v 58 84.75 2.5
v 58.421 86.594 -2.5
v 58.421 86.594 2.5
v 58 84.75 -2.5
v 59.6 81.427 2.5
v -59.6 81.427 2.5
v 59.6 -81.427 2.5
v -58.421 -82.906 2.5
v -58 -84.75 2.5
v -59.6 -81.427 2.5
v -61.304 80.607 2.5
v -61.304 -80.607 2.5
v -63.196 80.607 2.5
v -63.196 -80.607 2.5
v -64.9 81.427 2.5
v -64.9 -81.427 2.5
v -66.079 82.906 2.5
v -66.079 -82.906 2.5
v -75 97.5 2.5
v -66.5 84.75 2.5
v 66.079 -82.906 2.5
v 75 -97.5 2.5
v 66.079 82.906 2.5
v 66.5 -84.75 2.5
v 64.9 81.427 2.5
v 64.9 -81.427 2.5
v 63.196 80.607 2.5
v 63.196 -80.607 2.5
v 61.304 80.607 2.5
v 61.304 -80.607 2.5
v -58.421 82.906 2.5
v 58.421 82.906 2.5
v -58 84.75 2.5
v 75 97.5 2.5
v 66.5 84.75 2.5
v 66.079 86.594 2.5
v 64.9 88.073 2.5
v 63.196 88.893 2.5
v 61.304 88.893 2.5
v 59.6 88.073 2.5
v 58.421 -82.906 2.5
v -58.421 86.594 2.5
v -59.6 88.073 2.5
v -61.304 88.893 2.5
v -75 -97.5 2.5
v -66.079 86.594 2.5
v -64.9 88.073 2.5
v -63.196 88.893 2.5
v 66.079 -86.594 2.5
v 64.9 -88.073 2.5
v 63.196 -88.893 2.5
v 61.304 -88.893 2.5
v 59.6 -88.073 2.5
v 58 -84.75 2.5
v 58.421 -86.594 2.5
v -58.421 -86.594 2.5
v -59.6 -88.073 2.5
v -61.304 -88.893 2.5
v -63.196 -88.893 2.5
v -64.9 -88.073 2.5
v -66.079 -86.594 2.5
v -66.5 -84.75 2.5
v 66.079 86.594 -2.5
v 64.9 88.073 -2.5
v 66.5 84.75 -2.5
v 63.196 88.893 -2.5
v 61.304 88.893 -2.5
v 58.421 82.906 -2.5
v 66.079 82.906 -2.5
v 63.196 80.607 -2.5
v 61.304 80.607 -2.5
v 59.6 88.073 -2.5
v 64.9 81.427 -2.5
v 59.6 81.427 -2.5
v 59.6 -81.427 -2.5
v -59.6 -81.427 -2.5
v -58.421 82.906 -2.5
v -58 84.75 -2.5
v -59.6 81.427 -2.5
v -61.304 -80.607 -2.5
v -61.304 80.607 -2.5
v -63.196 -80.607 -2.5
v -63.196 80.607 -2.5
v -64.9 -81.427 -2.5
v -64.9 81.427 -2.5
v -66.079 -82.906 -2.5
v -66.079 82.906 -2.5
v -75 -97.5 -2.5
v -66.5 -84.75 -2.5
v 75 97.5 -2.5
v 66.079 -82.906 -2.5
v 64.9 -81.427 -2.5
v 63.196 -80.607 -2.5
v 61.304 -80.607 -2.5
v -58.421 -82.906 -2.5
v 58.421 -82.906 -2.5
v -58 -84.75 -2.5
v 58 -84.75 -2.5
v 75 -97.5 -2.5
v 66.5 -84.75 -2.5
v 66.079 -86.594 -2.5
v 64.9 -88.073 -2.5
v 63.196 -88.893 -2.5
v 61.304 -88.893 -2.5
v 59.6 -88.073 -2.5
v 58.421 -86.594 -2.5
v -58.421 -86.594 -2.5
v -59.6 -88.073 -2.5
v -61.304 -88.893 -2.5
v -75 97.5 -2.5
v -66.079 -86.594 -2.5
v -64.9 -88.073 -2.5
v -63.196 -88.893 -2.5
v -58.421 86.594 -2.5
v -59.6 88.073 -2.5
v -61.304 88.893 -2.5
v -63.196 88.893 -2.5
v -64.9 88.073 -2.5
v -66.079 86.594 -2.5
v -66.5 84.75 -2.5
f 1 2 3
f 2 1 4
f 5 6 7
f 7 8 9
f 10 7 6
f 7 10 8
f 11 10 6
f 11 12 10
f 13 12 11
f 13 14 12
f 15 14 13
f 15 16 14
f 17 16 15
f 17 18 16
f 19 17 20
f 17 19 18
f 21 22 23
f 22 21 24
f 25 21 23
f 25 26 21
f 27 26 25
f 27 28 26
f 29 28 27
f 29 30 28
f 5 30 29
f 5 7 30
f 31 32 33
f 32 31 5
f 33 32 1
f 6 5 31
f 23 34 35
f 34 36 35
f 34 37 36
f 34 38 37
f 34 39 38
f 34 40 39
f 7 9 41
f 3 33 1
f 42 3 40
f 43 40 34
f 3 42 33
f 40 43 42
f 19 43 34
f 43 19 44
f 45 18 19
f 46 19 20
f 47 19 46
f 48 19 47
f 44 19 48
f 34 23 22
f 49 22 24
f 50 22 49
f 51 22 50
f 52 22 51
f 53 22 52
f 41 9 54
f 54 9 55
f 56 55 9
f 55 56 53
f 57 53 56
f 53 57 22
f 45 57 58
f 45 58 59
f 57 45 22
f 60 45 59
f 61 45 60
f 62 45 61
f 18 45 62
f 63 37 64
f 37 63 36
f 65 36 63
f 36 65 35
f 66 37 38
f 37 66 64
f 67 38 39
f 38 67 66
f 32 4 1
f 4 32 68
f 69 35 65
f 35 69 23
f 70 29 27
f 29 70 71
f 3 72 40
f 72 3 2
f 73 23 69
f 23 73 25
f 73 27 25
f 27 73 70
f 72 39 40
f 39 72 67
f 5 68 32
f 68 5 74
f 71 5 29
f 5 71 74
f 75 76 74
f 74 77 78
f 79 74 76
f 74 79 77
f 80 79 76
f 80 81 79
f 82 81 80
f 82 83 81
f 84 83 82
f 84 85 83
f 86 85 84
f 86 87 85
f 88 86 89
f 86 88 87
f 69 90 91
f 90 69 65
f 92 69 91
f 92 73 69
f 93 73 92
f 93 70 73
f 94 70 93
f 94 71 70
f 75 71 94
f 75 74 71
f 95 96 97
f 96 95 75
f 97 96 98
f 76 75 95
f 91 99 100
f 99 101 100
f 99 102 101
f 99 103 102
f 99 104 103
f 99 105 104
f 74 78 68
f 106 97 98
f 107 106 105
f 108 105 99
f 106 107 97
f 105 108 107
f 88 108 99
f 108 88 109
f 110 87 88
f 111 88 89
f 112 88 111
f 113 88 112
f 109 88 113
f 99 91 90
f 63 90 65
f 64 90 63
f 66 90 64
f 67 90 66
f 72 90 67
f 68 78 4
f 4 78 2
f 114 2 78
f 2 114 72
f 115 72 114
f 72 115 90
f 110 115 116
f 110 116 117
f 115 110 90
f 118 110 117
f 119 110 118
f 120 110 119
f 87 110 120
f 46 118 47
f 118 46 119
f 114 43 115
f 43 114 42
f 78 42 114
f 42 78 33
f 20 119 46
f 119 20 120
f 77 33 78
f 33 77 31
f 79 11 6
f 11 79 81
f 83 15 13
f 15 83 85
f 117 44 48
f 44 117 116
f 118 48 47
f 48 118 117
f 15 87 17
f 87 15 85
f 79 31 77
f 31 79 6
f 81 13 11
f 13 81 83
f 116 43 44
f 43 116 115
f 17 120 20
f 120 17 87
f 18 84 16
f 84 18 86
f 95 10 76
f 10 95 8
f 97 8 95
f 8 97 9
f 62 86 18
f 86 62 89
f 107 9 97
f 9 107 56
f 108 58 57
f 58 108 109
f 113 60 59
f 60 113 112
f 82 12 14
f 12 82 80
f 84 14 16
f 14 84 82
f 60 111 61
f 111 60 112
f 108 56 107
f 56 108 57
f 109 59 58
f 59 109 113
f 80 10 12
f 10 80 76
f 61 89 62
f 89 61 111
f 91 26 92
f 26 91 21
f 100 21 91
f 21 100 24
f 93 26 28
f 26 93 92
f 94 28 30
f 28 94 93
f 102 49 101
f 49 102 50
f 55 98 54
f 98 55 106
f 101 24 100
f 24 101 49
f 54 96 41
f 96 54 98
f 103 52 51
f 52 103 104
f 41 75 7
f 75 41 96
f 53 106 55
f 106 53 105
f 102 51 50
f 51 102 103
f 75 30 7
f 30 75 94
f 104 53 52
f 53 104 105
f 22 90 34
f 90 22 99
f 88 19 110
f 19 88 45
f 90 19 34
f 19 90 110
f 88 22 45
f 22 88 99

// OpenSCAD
// Generated by SolidPython 1.1.3 on 2024-01-15 23:59:08


difference() {
	cube(center = true, size = [150, 195.0000000000, 5]);
	union() {
		translate(v = [62.2500000000, 84.7500000000]) {
			cylinder(center = true, h = 5, r = 4.2500000000);
		}
		translate(v = [-62.2500000000, 84.7500000000]) {
			cylinder(center = true, h = 5, r = 4.2500000000);
		}
		translate(v = [-62.2500000000, -84.7500000000]) {
			cylinder(center = true, h = 5, r = 4.2500000000);
		}
		translate(v = [62.2500000000, -84.7500000000]) {
			cylinder(center = true, h = 5, r = 4.2500000000);
		}
	}
}
/***********************************************
*********      SolidPython code:      **********
************************************************
 
import solid
import numpy as np
import numbers
import pudb
from solid.utils import *
import viewscad
import subprocess
import os
import os.path as osp
import math
import sys

chamfer_extrude=solid.import_scad("./chamfer_extrude.scad")
chamfer_extrude=chamfer_extrude.chamfer_extrude
r = viewscad.Renderer(width=800, height=800)

def debug(model,f_name,path="/home/ts/code/projects/mfd/designs/debug"):
    solid.scad_render_to_file(model,osp.join(path,f_name)+".scad")
#generate position list of wells using offset from center
wells_pos_from_center_4 = lambda offset: [[-offset,offset],
                                        [offset, offset],
                                        [-offset, -offset],
                                        [offset, -offset]]
wells_pos_from_center_2 = lambda offset: [[offset,0],
                                        [-offset,0]]

def make_well(dims,shape=None,height=None,dxf=False):
    def circle_cylinder():
        if dxf or (height is None):
            well = solid.circle(r=dims, segments=64)
        else:
            well = solid.cylinder(r=dims, h=height, segments=64, center = True)
        return well
    if dims is None:
        sys.exit("radius needs to be a number")
    if isinstance(dims, numbers.Number):
        well =circle_cylinder()
    elif len(dims)==1:
        if isinstance(dims[1], numbers.Number):
            well =circle_cylinder()
        else:
            sys.exit("radius needs to be a number")
    elif len(dims)==2:
        well = solid.square(dims,center = True)
    elif len(dims)==3:
        well = solid.cube(dims, center = True)
    return well

def wells_top_bottom(center_gap,device_dims=None,shape=None,height=None, positions = None, dxf = False,well_shape=None):
    if well_shape == None:
        well_shape = make_well(device_dims,shape=shape,height=height,dxf=dxf)
    wells = []
    if positions is None:
        offset = radius+radius/2.0
        positions = wells_pos_from_center_2(offset)
    if dxf or (height is None):
        height = 0
    for position in positions:
        if dxf:
            wells.append(solid.translate([position[0],position[1]])(well_shape))
        else:
            wells.append(solid.translate([position[0],position[1],height/2.0])(well_shape))
    return  union()(*wells)

#place wells in four corners 
def four_corner(radius,height=None, positions = None, dxf = False):
    #if well pos not specified set
    #to equally spaced by half radius
    if positions is None:
        offset = radius+radius/2.0
        positions = wells_pos_from_center_4(offset)
    if dxf or (height is None):
        height = 0
    #make wells at positions with specified radius and height
    wells = []
    for position in positions:
        #make circle if making dxf
        if dxf:
            well_shape = solid.circle(r=radius, segments=64)
            well_shape = solid.translate([position[0],position[1]])(well_shape)
        #if stl make cylinder
        else:
            well_shape = solid.cylinder(r=radius, h=height, segments=64, center = True)
            well_shape = solid.translate([position[0],position[1],height/2.0])(well_shape)
        wells.append(well_shape)
    return  union()(*wells)

#generate channels 
def make_channels(length,width,height=0,num_chans=1,max_chans=None,spacing=None, dxf = False,
                  rotate_channels=False):
    if dxf or (height is None):
        height = 0
    #if channel gap not defined, is equal to
    if spacing is None: spacing = width
    #calculate number of channels if fitting max num within given width
    if not max_chans is None:
        import math
        num_chans = math.floor((max_chans-spacing)/(width+spacing))
    #get total width of channel section  
    total_width = (width*num_chans)+(spacing*(num_chans-1))

    #make template channel
    #if rotate_channels: width, length = length, width
    if dxf:
        channel_t = solid.square([length,width],center = True)
    else:
        channel_t = solid.cube([length,width,height], center = True)

    #if number channels is even, offset the first channel to center its gap
    if num_chans % 2 == 0: centering = -(width/2.0+spacing/2.0)
    else: centering = 0
    #move template channel up to align bottom at z = 0 
    #and offset center if necessary
    if dxf:
        channel_t = solid.translate([0,centering])(channel_t)
    else:
        channel_t = solid.translate([0,centering,height/2.0])(channel_t)

    #if rotate_channels: length,width = width,length
    #start making the channels
    channels = []
    for i in range(num_chans):
        #if i=0 there is no translation
        #if i=1, we make the first channel adjacent to second
        direction = i

        #if i>=1, we add channels alternating left and right
        if i >= 1:
            direction = -(i/2.0)
            if i % 2 == 1: direction = (-direction)+0.5
                
        #make channel at right position and add it to channel list
        translation_coords = [0,direction*(width+spacing)]
        #if rotate_channels: translation_coords = [direction*(width+spacing),0]
        if dxf:
            channel = solid.translate(translation_coords)(channel_t)
        else:
            channel = solid.translate([*translation_coords,0])(channel_t)
        channels.append(channel)
    
    #group all channels as one object
    channels = union()(*channels)
    #compute the x,y,z dimensions in order to pass as arguments 
    #for construction of other parts of device (such as the chambers)
    measurements = {'x':(length/2.0,-length/2.0),
                    'y':(total_width/2.0,-total_width/2.0)}
    if not dxf:
        measurements['z'] = (height,0)
    if rotate_channels:
        channels = solid.rotate(90)(channels)
        measurements['x'],measurements['y']=measurements['y'],measurements['x']
    return channels,measurements

def make_chambers(msrs,height=None,extra=0,len_until=None,width=None, dxf = False):
    #computes x,y,z length
    total = lambda x : abs(x[0]) + abs(x[1])
    
    #if specific height if specified
    #otherwise use same height as channels
    if dxf:
        pass
    elif not height is None:
        msrs['z'] = (height,0)
    else:
        msrs['z'] = (0,0)
        
    #make copy of measurements from channels to modify chamber dimensions 
    #and add length to chambers as specified
    chamber_dims = msrs.copy()
    #calculate length of chamber to reach specified offset
    if not len_until is None:
        chamber_len = len_until-(msrs['x'][0])
    #or add specified length to channel length (if not specified, adds 0)
    else:
        chamber_len = msrs['x'][0]+extra
    #set the chamber length based 
    chamber_dims['x'] = (chamber_len/2.0,-(chamber_len/2.0))
    #compute final dimensions of chamber
    if not width is None:
        chamber_dims['y'] = (width/2.0,-width/2.0)
    chamber_dims = [total(size) for size in chamber_dims.values()]
        
    #calculate chamber translation offset to place adjacent to channels
    chamber_trslt = msrs['x'][0]+(chamber_len/2.0)
    #compute chamber translation coordinates to align with channels
    #x = 1 moves chamber above channels
    #x = -1 moves chamber below channels
    if dxf:
        trslt = lambda x : [x*(chamber_trslt),0]
    else:
        trslt = lambda x : [x*(chamber_trslt),0,msrs['z'][0]/2.0]
    
    #function to make chamber at top or at bottom 
    if dxf:
        move = lambda x : solid.translate(trslt(x))(solid.square(chamber_dims, center = True) )
    else:
        move = lambda x : solid.translate(trslt(x))(solid.cube(chamber_dims,center = True))
    #make top and bottom chambers and return them as grouped
    top = move(1)
    bottom = move(-1)
    #chambers=solid.rotate(90)(solid.union()(top,bottom))
    chambers=(solid.union()(top,bottom))

    return chambers

#create alignment features 
def alignment_features(unit,dims,grid_size, mask_size = None, alignment = "hollow", units_from_center = (2.5,2.5), corner_len=None):
    width = grid_size[0]*dims[0]
    length = grid_size[1]*dims[1]
    if mask_size is None and corner_len is None:
        corner_len = (dims[0] + dims[1]) /2 / 8
    corner = lambda thickness_div : solid.union()( solid.square([corner_len,corner_len/thickness_div],center=False), solid.square([corner_len/thickness_div,corner_len],center=False) )
    
    def make_full(thickness_div):
        thickness = corner_len/thickness_div
        tr = solid.translate([0, 0, 0 ])(solid.rotate(180)(corner(thickness_div)))
        tr = solid.translate([thickness/2,thickness/2,0])(tr)
        bl = solid.translate([0, 0, 0 ])(solid.rotate(0)(corner(thickness_div)))
        bl = solid.translate([-thickness/2,-thickness/2,0])(bl)
        return solid.union()(tr,bl)
    
    def make_hollow(thickness_div):
        thickness = corner_len/(thickness_div/2)
        inner = make_full(thickness_div)
        outer = make_full(thickness_div/2)
        hollow = outer - inner 
        return hollow
    
    center = (width /2 , length/2)
    mask_pos = lambda x,y : (center[0] + x*(float(units_from_center[0])*dims[0]), center[1] + y*(float(units_from_center[1])*dims[1]))
    positions = []
    positions.append(mask_pos(1,0))
    positions.append(mask_pos(0,1))
    positions.append(mask_pos(-1,0))
    positions.append(mask_pos(0,-1))
    make_mask = lambda mtype : make_hollow(8) if mtype == "hollow" else make_full(8)
    masks = [ solid.translate([*position,0])(make_mask(alignment)) for position in positions]
    
    solid.scad_render_to_file(solid.union()(*masks),"./designs/open_chamber/masks.scad")
    #return unit - solid.union()(*masks)
    return solid.union()(*masks,unit)

def create_outline(thickness, array, dims, grid_size,):
    width = grid_size[0]*dims[0] + thickness *2
    length = grid_size[1]*dims[1] + thickness *2
    outer = solid.translate([-thickness, -thickness,0])(solid.square([width, length]))
    return outer-array

def create_wall(wall_thickness, outline_thickness, dims, grid_size, wall_height = 2000, dxf = False):
    inner_width = grid_size[0]*dims[0] + outline_thickness *2
    inner_length = grid_size[1]*dims[1] + outline_thickness *2
    outer_width = inner_width + wall_thickness * 2
    outer_length = inner_length + wall_thickness * 2
    outer_pos_x = -outline_thickness-wall_thickness
    outer_pos_y = -outline_thickness-wall_thickness
    inner_pos_x = -outline_thickness
    inner_pos_y = -outline_thickness
    if dxf:
        inner_wall = solid.translate([inner_pos_x,
                                      inner_pos_y,
                                      0])(solid.square([inner_width, inner_length]))
        outer_wall = solid.translate([outer_pos_x,
                                      outer_pos_y,
                                      0])(solid.square([outer_width, outer_length]))

        return outer_wall-inner_wall
    else:
        inner_wall = solid.translate([inner_pos_x,
                                      inner_pos_y,
                                      0])(solid.cube([inner_width, inner_length,wall_height]))
        outer_wall = solid.translate([outer_pos_x,
                                      outer_pos_y,
                                      0])(solid.cube([outer_width, outer_length,wall_height]))

        return outer_wall-inner_wall, {'wall_height': wall_height,
                                       'wall_thickness': wall_thickness,
                                       'inner_width':inner_width,
                                       'inner_length': inner_length,
                                       'outer_width': outer_width,
                                       'outer_length': outer_length,
                                       'outer_pos_x' : outer_pos_x,
                                       'outer_pos_y' : outer_pos_y,
                                       'inner_pos_x' : inner_pos_x,
                                       'inner_pos_y' : inner_pos_y}

def create_thicker_wall(wall_thickness, outer_wall_offset, wall_dims, dims, grid_size, height_start = .2, height_end=2, dxf = False):
    addon_wall,thicker_wall_dims = create_wall(wall_thickness, outer_wall_offset, dims, grid_size, wall_height=height_end-height_start, dxf = False)
    addon_wall = solid.translate([0,0,height_start])(addon_wall)

    thicker_wall_dims['wall_height'] = height_end
    thicker_wall_dims['wall_thickness'] = wall_dims['wall_thickness'] + wall_thickness
    return addon_wall, thicker_wall_dims
 
def add_lock_to_wall(wall,wall_dims,y_offset = 0,cut_ratio=0.7,L_length=3, gap_ratio=0.05, axis="x",width_ratio=1/2):
    # Makes L shape
    def make_L(max_length,length_thickness,max_width,width_thickness,height,y_offset):
        length = solid.cube([max_length,length_thickness,height])
        width = solid.cube([width_thickness,max_width,height])
        width = solid.translate([max_length-(width_thickness),0,0])(width)
        L = solid.union()(width,length)
        debug(L,"L")
        if axis == "x":
            L = solid.rotate(-90)(L)
            L = solid.translate([0,max_length,0])(L)
        else:
            L = solid.rotate(-180)(L)
            L = solid.translate([max_length,max_width,0])(L)
        return solid.translate([0,0,y_offset])(L)
    
    lock_length = L_length
    lock_width = wall_dims['wall_thickness']*width_ratio
    lock_length_thickness = lock_width/2
    lock_width_thickness = lock_width/2
    L_lock = make_L(lock_length,lock_length_thickness,lock_width,lock_width_thickness, wall_dims['wall_height']-y_offset, y_offset)
    
    margin_space = lock_length - lock_length*(1-gap_ratio)
    key_length = lock_length-margin_space
    key_length_thickness = lock_length_thickness-(margin_space*2)
    key_width = lock_width-(margin_space*2)
    key_width_thickness = lock_width_thickness-(margin_space*2)
    L_key = make_L(key_length,key_length_thickness,key_width,key_width_thickness, wall_dims['wall_height']-y_offset, y_offset)
    L_key = solid.translate([margin_space,margin_space,0])(L_key)
    L = solid.union()(L_lock,L_key)
    debug(L,"L")
    
    #Make cube to be used as negative to split frame in a half
    #Can choose if making left or right negative, specify ratio of split
    def make_negative(right,cut_ratio):
        if axis == "x":
            if right:
                length = wall_dims['outer_length']*(1-cut_ratio)
                pos_x = wall_dims['outer_pos_x']+(wall_dims['outer_length']*cut_ratio)
            else:
                length = wall_dims['outer_length']*(cut_ratio)
                pos_x = wall_dims['outer_pos_x'] 
            negative = solid.cube([wall_dims['outer_width'],length, wall_dims['wall_height']])
            negative = solid.translate([wall_dims['outer_pos_y'],pos_x,0])(negative)
        else:
            if right:
                length = wall_dims['outer_width']*(1-cut_ratio)
                pos_x = wall_dims['outer_pos_y']+(wall_dims['outer_width']*cut_ratio)
            else:
                length = wall_dims['outer_width']*(cut_ratio)
                pos_x = wall_dims['outer_pos_y'] 
            negative = solid.cube([length,wall_dims['outer_length'], wall_dims['wall_height']])
            negative = solid.translate([pos_x,wall_dims['outer_pos_x'],0])(negative)
        return negative, pos_x, length 
                      
    #Make negatives
    negative_right, right_half_pos_x, right_half_length = make_negative(True,cut_ratio)
    negative_left, left_half_pos_x, right_half_length = make_negative(False,cut_ratio)
    #Make halves
    left_half = solid.difference()(wall,negative_right)
    right_half = solid.difference()(wall,negative_left)
    def place_L(L, L_length,L_width):
        #Place L on top wall       
        offset_to_center = (wall_dims['wall_thickness']-L_width)/2
        if axis == "x":
            y_pos_top = (wall_dims['outer_pos_y'] +
                    wall_dims['outer_width'] - 
                    L_width - offset_to_center)
            top_L = solid.translate([y_pos_top,
                                     right_half_pos_x-(L_length),
                                     0])(L)
            #Place L on bottom wall       
            y_pos_bottom = wall_dims['outer_pos_y']+offset_to_center
            bottom_L = solid.translate([y_pos_bottom,
                                        right_half_pos_x-L_length,
                                        0])(L)
        else:
            y_pos_top = (wall_dims['outer_pos_x'] +
                    wall_dims['outer_length'] -
                    (L_width+offset_to_center))
            top_L = solid.translate([right_half_pos_x-L_length,
                                     y_pos_top,
                                     0])(L)
            #Place L on bottom wall       
            y_pos_bottom = wall_dims['outer_pos_y']+offset_to_center
            bottom_L = solid.translate([right_half_pos_x-L_length,
                                        y_pos_bottom,
                                        0])(L)
        return bottom_L, top_L
    #Make complimentary L pieces through union and differences
    #Make Lock
    bottom_L_lock, top_L_lock = place_L(L_lock,L_length,lock_width)
    left_half = solid.difference()(left_half,bottom_L_lock)
    left_half = solid.difference()(left_half,top_L_lock)
    #Make Key
    bottom_L_key, top_L_key = place_L(L_key,L_length,lock_width)
    right_half = solid.union()(right_half,bottom_L_key)
    right_half = solid.union()(right_half,top_L_key)
    return left_half, right_half


#build a row x col grid of containment units
def make_unit_array(unit,dims,grid_size, dxf = False, alignment = None, mask_size = None,
                    units_from_center = None,alignment_offset=None, alignment_mark_size=1):
    units = []
    for col in range(grid_size[1]):
        for row in range(grid_size[0]):
            if dxf:
                units.append(solid.translate([row*dims[0],col*dims[1]])(unit))
            else:
                units.append(solid.translate([row*dims[0],col*dims[1],dims[2]/2.0])(unit))
    array = solid.union()(*units)
    if (not alignment is None) and dxf:
        if not alignment_offset is None:
            array = solid.translate([alignment_offset[0],alignment_offset[1]])(array)
        array = alignment_features(array,dims, grid_size, alignment = alignment, mask_size = None, units_from_center = units_from_center,corner_len=alignment_mark_size)
        if not alignment_offset is None:
            array = solid.translate([-alignment_offset[0],-alignment_offset[1]])(array)
    return array


def make_taylor(wells_pos = wells_pos_from_center_4(2.25), well_rad = 1.5 ,
                well_height = 2, chan_w = 0.01, chan_l = 1, chan_h = 0.010 ,
                chan_gap = 0.040, max_chans = None,num_chans=100, chamber_height  = 0.100,
                columns = 1, rows = 1, chamber_len_until=2.25, add_channels = True, add_wells = True, 
                add_chambers = True, save_path = "./", alignment = None, units_from_center = 2,
                mask_size = None, render_stl = False, outline_thickness = 0.050, dxf = True,
                wall_height = 15, wall_thickness = 0.95, casing_x=9, casing_y=9, casing_z=0,rotate_units=0):

    dims = [casing_x, casing_y, casing_z]
    wells = four_corner(well_rad,well_height, dxf = dxf, positions = wells_pos)
    debug(wells,"wells")
    channels, msrs = make_channels(chan_l,chan_w,chan_h,dxf=dxf, spacing = chan_gap, max_chans=max_chans,num_chans=num_chans)
    debug(channels,"channels")
    chambers = make_chambers(msrs,dxf = dxf, height=chamber_height,len_until=chamber_len_until)
    debug(chambers,"chambers")

    #add together and render
    device_parts = []
    if add_channels:
        device_parts.append(channels)
    if add_wells:
        device_parts.append(wells)
    if add_chambers:
        device_parts.append(chambers)
    device=union()(*device_parts)
    device = rotate(rotate_units)(device)

    device=solid.translate([dims[0]/2.0,dims[1]/2.0,0])(device)
    channels = rotate(rotate_units)(channels)
    channels=solid.translate([dims[0]/2,dims[1]/2,0])(channels)
    chambers_wells = union()(wells,chambers)
    chambers_wells = rotate(rotate_units)(chambers_wells)
    chambers_wells=solid.translate([dims[0]/2,dims[1]/2,0])(chambers_wells)

    file_name = str(rows)+'x'+str(columns)+'_units_'
    grid_size = [rows,columns]

    if alignment:
        alignment="full"
    device = make_unit_array(device,dims,grid_size, dxf=dxf, alignment = alignment,
                                 units_from_center = units_from_center)
    channels = make_unit_array(channels,dims,grid_size, dxf=dxf, alignment = alignment,
                                 units_from_center = units_from_center)
    if alignment=="full":
        alignment="hollow"

    chambers_wells = make_unit_array(chambers_wells,dims,grid_size, dxf=dxf, alignment = alignment,
                                 units_from_center =units_from_center)

    def save_model(model,prefix):
        model_fname = os.path.abspath(save_path+prefix+"_"+file_name+".scad")
        solid.scad_render_to_file(model,model_fname)
        return model_fname

    wells_fname = save_model(wells,"wells")
    channels_fname = save_model(channels,"channels")
    device_fname = save_model(device,"device")
    chambers_wells_fname = save_model(chambers_wells,"chambers_wells")
    return (chambers_wells,chambers_wells_fname), (channels,channels_fname), (device,device_fname)

def make_device(design='open',rows=8,columns=6,wells_pos = 4.5,well_offset=3.2, well_rad=3.2,well_height=0.1,
                chan_l=1,chan_w=0.01,chan_h=0.01,chan_gap=0.015,num_chans=101,dxf=True,save_path="./designs/open_chamber/",
                casing_x=9.0,casing_y=18.0,casing_z=0,rotate_units=90,units_from_center=(3,1),chamber_len_until=4.5,
                chamber_width=None,alignment=True, add_wells=True, add_channels=True,add_chambers=True,well_shape=None):

    dims = [casing_x, casing_y, casing_z]
    if design == "open":
        wells_pos=wells_pos_from_center_2(wells_pos)
        wells = wells_top_bottom(well_offset*2,device_dims=well_rad,height=well_height, dxf = dxf, positions = wells_pos,well_shape=well_shape)
    elif design == "closed":
        wells_pos=wells_pos_from_center_4(wells_pos)
        debug(wells,"wells")
        wells = four_corner(well_offset,well_height,device_dims=well_rad, dxf = dxf, positions = wells_pos)
    else:
        print(design+" is not a valid design.\n Choose valid design: 'open' or 'closed'")
        exit()
    wells = rotate(rotate_units)(wells)
    wells=solid.translate([dims[0]/2,dims[1]/2,0])(wells)
    debug(wells,"wells")

    channels, msrs = make_channels(chan_l,chan_w,chan_h,dxf=dxf, spacing = chan_gap, num_chans=num_chans,rotate_channels=False)
    channels = rotate(rotate_units)(channels)
    channels=solid.translate([dims[0]/2,dims[1]/2,0])(channels)

    chambers=make_chambers(msrs,height=None,extra=0,len_until=chamber_len_until, width=chamber_width,dxf = dxf)
    chambers = rotate(rotate_units)(chambers)
    chambers=solid.translate([dims[0]/2,dims[1]/2,0])(chambers)

    device_parts = []
    if add_channels:
        device_parts.append(channels)
    if add_wells:
        device_parts.append(wells)
    if add_chambers:
        device_parts.append(chambers)
    device = union()(*device_parts)
    #device = rotate(rotate_units)(device)
    #device=solid.translate([dims[0]/2.0,dims[1]/2.0,0])(device)

    chambers_wells = []
    if add_chambers:
        chambers_wells.append(chambers)
    if add_wells:
        chambers_wells.append(wells)
    chambers_wells = union()(*chambers_wells)
    #chambers_wells = union()(wells,chambers)
    #chambers_wells = rotate(rotate_units)(chambers_wells)
    #chambers_wells=solid.translate([dims[0]/2,dims[1]/2,0])(chambers_wells)

    file_name = str(rows)+'x'+str(columns)+'_units_'

    grid_size = [rows,columns]
    if alignment:
        alignment="full"
    device = make_unit_array(device,dims,grid_size, dxf=dxf, alignment = alignment,
                                 units_from_center = units_from_center)
    channels = make_unit_array(channels,dims,grid_size, dxf=dxf, alignment = alignment,
                                 units_from_center = units_from_center)
    if alignment=="full":
        alignment="hollow"

    chambers_wells = make_unit_array(chambers_wells,dims,grid_size, dxf=dxf, alignment = alignment,
                                 units_from_center =units_from_center)

    def save_model(model,prefix):
        model_fname = os.path.abspath(save_path+prefix+"_"+file_name+".scad")
        solid.scad_render_to_file(model,model_fname)
        return model_fname

    wells_fname = save_model(wells,"wells")
    channels_fname = save_model(channels,"channels")
    device_fname = save_model(device,"device")
    chambers_wells_fname = save_model(chambers_wells,"chambers_wells")
    return (chambers_wells,chambers_wells_fname), (channels,channels_fname), (device,device_fname)


def make_open_chamber(rows=8,columns=6,wells_pos = wells_pos_from_center_2(4.5), well_rad=3.2,well_height=0.1,
                      chan_l=1,chan_w=0.01,chan_h=0.01,chan_gap=0.015,num_chans=101,dxf=True,save_path="./designs/open_chamber/",
                      casing_x=9.0,casing_y=18.0,casing_z=0,rotate_units=90,units_from_center=(3,1),chamber_len_until=4.5,
                      chamber_width=None,alignment=True, add_wells=True, add_channels=True,add_chambers=True,well_shape=None):

    dims = [casing_x, casing_y, casing_z]
    wells = wells_top_bottom(well_rad,height=well_height, dxf = dxf, positions = wells_pos, well_shape=well_shape)
    channels, msrs = make_channels(chan_l,chan_w,chan_h,dxf=dxf, spacing = chan_gap, num_chans=num_chans,rotate_channels=False)
    chambers=make_chambers(msrs,height=None,extra=0,len_until=chamber_len_until, width=chamber_width,dxf = dxf)
    debug(chambers,"chambers")
    device_parts = []
    if add_channels:
        device_parts.append(channels)
    if add_wells:
        device_parts.append(wells)
    if add_chambers:
        device_parts.append(chambers)
    device = union()(*device_parts)
    device = rotate(rotate_units)(device)
    device=solid.translate([dims[0]/2.0,dims[1]/2.0,0])(device)
    channels = rotate(rotate_units)(channels)
    channels=solid.translate([dims[0]/2,dims[1]/2,0])(channels)
    chambers_wells = union()(wells,chambers)
    chambers_wells = rotate(rotate_units)(chambers_wells)
    chambers_wells=solid.translate([dims[0]/2,dims[1]/2,0])(chambers_wells)

    file_name = str(rows)+'x'+str(columns)+'_units_'

    grid_size = [rows,columns]
    if alignment:
        alignment="full"
    device = make_unit_array(device,dims,grid_size, dxf=dxf, alignment = alignment,
                                 units_from_center = units_from_center)
    channels = make_unit_array(channels,dims,grid_size, dxf=dxf, alignment = alignment,
                                 units_from_center = units_from_center)
    if alignment=="full":
        alignment="hollow"

    chambers_wells = make_unit_array(chambers_wells,dims,grid_size, dxf=dxf, alignment = alignment,
                                 units_from_center =units_from_center)

    def save_model(model,prefix):
        model_fname = os.path.abspath(save_path+prefix+"_"+file_name+".scad")
        solid.scad_render_to_file(model,model_fname)
        return model_fname

    wells_fname = save_model(wells,"wells")
    channels_fname = save_model(channels,"channels")
    device_fname = save_model(device,"device")
    chambers_wells_fname = save_model(chambers_wells,"chambers_wells")
    return (chambers_wells,chambers_wells_fname), (channels,channels_fname), (device,device_fname)

def to_dxf(scad_path):
    dxf_path = scad_path.replace(".scad",".dxf")
    subprocess.call(["openscad", "-o", dxf_path, scad_path])
    import ezdxf
    temp_dxf = ezdxf.readfile(dxf_path)
    temp_dxf.saveas(dxf_path)

#def make_walls(diameter,thickness,grid_size,dims,height=20,segments=256,make_inner=True):
#    wafer_wall_out = solid.cylinder(r=diameter/2,h=height, segments=segments)
#    wafer_wall_in = solid.cylinder(r=(diameter/2-thickness),h=height, segments=segments)
#    wafer_wall = solid.difference()(wafer_wall_out,wafer_wall_in)
#    wafer_wall = solid.translate([grid_size[1]*dims[1]/2.0,grid_size[0]*dims[0]/2.0])(wafer_wall)
#
#    vertical_wall_length = grid_size[1]*dims[1]
#    horizontal_wall_length = grid_size[0]*dims[0]
#    vertical_wall = solid.cube([vertical_wall_length,thickness,height],center = True)
#    vertical_wall = solid.translate([vertical_wall_length/2,0,height/2])(vertical_wall)
#    horizontal_wall = solid.cube([thickness,horizontal_wall_length,height],center = True)
#    horizontal_wall = solid.translate([0,vertical_wall_length/2,height/2])(horizontal_wall)
#    walls = []
#    walls.append(horizontal_wall)
#    walls.append(vertical_wall)
#    for col in range(grid_size[1]):
#        if col == grid_size[1]-1: 
#            walls.append(solid.translate([0,(col+1)*dims[1]])(vertical_wall))
#        elif col > 0 and col < grid_size[1]-1 and make_inner==True:
#            walls.append(solid.translate([0,(col+1)*dims[1]])(vertical_wall))
#    for row in range(grid_size[0]):
#        if row == grid_size[0]-1: 
#            walls.append(solid.translate([(row+1)*dims[0],0])(horizontal_wall))
#        elif row > 0 and row < grid_size[0]-1 and make_inner==True:
#            walls.append(solid.translate([(row+1)*dims[0],0])(horizontal_wall))
#    walls = union()(*walls)
#    wafer_walls = union()(walls,wafer_wall)
#    return walls,wafer_wall,wafer_walls

def make_walls(diameter,thickness,grid_size,dims,height=20,segments=256,make_inner=True,padx=0,pady=0):
    wafer_wall_out = solid.cylinder(r=diameter/2,h=height, segments=segments)
    wafer_wall_in = solid.cylinder(r=(diameter/2-thickness),h=height, segments=segments)
    wafer_wall = solid.difference()(wafer_wall_out,wafer_wall_in)
    wafer_wall = solid.translate([grid_size[1]*dims[1]/2.0,grid_size[0]*dims[0]/2.0])(wafer_wall)

    vertical_wall_length = grid_size[0]*dims[0]+padx
    horizontal_wall_length = grid_size[1]*dims[1]+pady
    vertical_wall = solid.cube([vertical_wall_length,thickness,height],center = True)
    vertical_wall = solid.translate([vertical_wall_length/2-pady/2,-padx/2,height/2])(vertical_wall)
    horizontal_wall = solid.cube([thickness,horizontal_wall_length,height],center = True)
    horizontal_wall = solid.translate([-pady/2,horizontal_wall_length/2-padx/2,height/2])(horizontal_wall)
    walls = []
    walls.append(horizontal_wall)
    walls.append(vertical_wall)
    for col in range(grid_size[1]):
        if col == grid_size[1]-1: 
            walls.append(solid.translate([0,(col+1)*dims[1]+pady])(vertical_wall))
        elif col > 0 and col < grid_size[1]-1 and make_inner==True:
            walls.append(solid.translate([0,(col+1)*dims[1]])(vertical_wall))
    for row in range(grid_size[0]):
        if row == grid_size[0]-1: 
            walls.append(solid.translate([(row+1)*dims[0]+padx,0])(horizontal_wall))
        elif row > 0 and row < grid_size[0]-1 and make_inner==True:
            walls.append(solid.translate([(row+1)*dims[0],0])(horizontal_wall))
    walls = union()(*walls)
    wafer_walls = union()(walls,wafer_wall)
    return walls,wafer_wall,wafer_walls

def save_model(model,base_path,base_name,dxf=True):
    if not os.path.exists(base_path):
        os.makedirs(base_path)
    dxf_path=osp.join(base_path,base_name+".scad")
    solid.scad_render_to_file(model,osp.join(dxf_path))
    if dxf:
        to_dxf(dxf_path)

def make_wafer(diameter,flat_len,thickness):
    wafer = solid.cylinder(r1=diameter/2,r2=diameter/2,h=thickness,segments=512,)()
    x_start_flat=(flat_len/2)
    y_start_flat = math.sqrt(((diameter/2)**2) - (x_start_flat**2) )
    height_delete_flat=diameter/2-y_start_flat
    flat_delete = solid.cube([flat_len,height_delete_flat,thickness],center=False)()
    flat_delete = solid.translate([-flat_len/2,y_start_flat,0])(flat_delete)
    wafer = solid.difference()(wafer,flat_delete)
    wafer = solid.rotate(90)(wafer)
    return wafer

def add_wafer_to_mask(wafer_size,flat_len,mask,grid_size,dims,wafer_line_thickness=0.1,outer_mask_thickness=5,alignment_offset=None):
    def make_wafer_mask(wafer_size,flat_len):
        wafer_mask = make_wafer(wafer_size,flat_len,1)
        wafer_mask = solid.projection()(wafer_mask)
        wafer_mask = solid.translate([grid_size[0]*dims[0]/2.0,grid_size[1]*dims[1]/2.0])(wafer_mask)
        if not alignment_offset is None:
            wafer_mask = solid.translate([-alignment_offset[0],-alignment_offset[1]])(wafer_mask)
        return wafer_mask

    inner_wafer_line_mask = make_wafer_mask(wafer_size-wafer_line_thickness/2,flat_len)
    outer_wafer_line_mask = make_wafer_mask(wafer_size+wafer_line_thickness/2,flat_len)
    outer_wafer_mask = make_wafer_mask(wafer_size+outer_mask_thickness,flat_len)
    outer_wafer_mask = solid.difference()(outer_wafer_mask,outer_wafer_line_mask)
    wafer_mask = solid.union()(outer_wafer_mask,inner_wafer_line_mask)

    return solid.difference()(wafer_mask,mask)

def make_posts(post_shape,post_height):
    posts = solid.linear_extrude(height=post_height)(post_shape)
    return posts

def make_wafer_empty(diameter,flat_len,thickness,margin,notch_len=20,notch_height=5,oversize=1.01):
    diameter*=oversize
    flat_len*=oversize
    wafer = make_wafer(diameter,flat_len,thickness)
    holder = solid.cylinder(r1=diameter/2+margin,r2=diameter/2+margin,h=thickness,segments=512)()
    holder = solid.difference()(holder,wafer)

    x_start_flat=(flat_len/2)
    y_start_flat = math.sqrt(((diameter/2)**2) - (x_start_flat**2) )
    height_delete_flat=diameter/2-y_start_flat
    notch = solid.cube([notch_len,notch_height,thickness],center=False)()
    notch = solid.translate([-notch_len/2,y_start_flat,0])(notch)
    notch = solid.rotate(90)(notch)
    return solid.difference()(holder,notch)

def wafer_print_calibration(diameter,thickness,height,z_offset):
    circles = []
    radii = []
    radii.append(diameter/2.0*0.8)
    radii.append(diameter/2.0*0.6)
    radii.append(diameter/2.0*0.4)
    radii.append(diameter/2.0*0.2)
    for radius in radii:
        inner = solid.cylinder(r1=radius-(thickness/2.0),r2=radius-(thickness/2.0),h=thickness,segments=512,)()
        outer = solid.cylinder(r1=radius+(thickness/2.0),r2=radius+(thickness/2.0),h=thickness,segments=512,)()
        diff = solid.difference()(outer,inner)
        circles.append(diff)
    circles = solid.union()(*circles)
    circles = solid.translate([0,0,z_offset])(circles)
    return circles

def make_rack(wells,dims,grid_size,alignment_offset,rack_x,rack_y,rack_thickness,bolt_width,add_bolts=True):

    #get X and Y dimensions of gride of pipette tips
    X_len = dims[0]*grid_size[0]
    Y_len = dims[1]*grid_size[1]
    #make rack
    rack = solid.cube([rack_x,rack_y,rack_thickness],center=True)

    if add_bolts:
    #add bolt holes
        bolt_hole=solid.cylinder(r=bolt_width/2,h=rack_thickness,center=True)()
        bolt_holes = []
        bolt_holes.append(solid.translate([rack_x/2-1.5*bolt_width,rack_y/2-1.5*bolt_width])(bolt_hole))
        bolt_holes.append(solid.translate([-rack_x/2+1.5*bolt_width,rack_y/2-1.5*bolt_width])(bolt_hole))
        bolt_holes.append(solid.translate([-rack_x/2+1.5*bolt_width,-rack_y/2+1.5*bolt_width])(bolt_hole))
        bolt_holes.append(solid.translate([rack_x/2-1.5*bolt_width,-rack_y/2+1.5*bolt_width])(bolt_hole))
        bolt_holes = solid.union()(*bolt_holes)
        rack=solid.difference()(rack,bolt_holes)
    rack_support = rack

    #center rack with pipette holes
    rack = solid.translate([0,0,rack_thickness/2])(rack)
    rack = solid.translate([X_len/2,Y_len/2])(rack)
    rack = solid.translate([-alignment_offset[0],-alignment_offset[1]])(rack)
    wells = solid.linear_extrude(height=rack_thickness)(wells)
    rack = solid.difference()(rack,wells)
    return rack, rack_support

def make_pillar(wells,dims,grid_size,alignment_offset,rack_x,rack_y,pillar_height,rack_thickness,bolt_width,add_bolts=True,taper_angle=1,bolt_position_corner=1.5):

    #get X and Y dimensions of gride of pipette tips
    X_len = dims[0]*grid_size[0]
    Y_len = dims[1]*grid_size[1]
    #make rack
    rack = solid.cube([rack_x,rack_y,rack_thickness],center=True)
    
    if add_bolts:
    #add bolt holes
        bolt_hole=solid.cylinder(r=bolt_width/2,h=rack_thickness,center=True)()
        bolt_holes = []
        bolt_holes.append(solid.translate([rack_x/2-bolt_position_corner*bolt_width,rack_y/2-bolt_position_corner*bolt_width])(bolt_hole))
        bolt_holes.append(solid.translate([-rack_x/2+bolt_position_corner*bolt_width,rack_y/2-bolt_position_corner*bolt_width])(bolt_hole))
        bolt_holes.append(solid.translate([-rack_x/2+bolt_position_corner*bolt_width,-rack_y/2+bolt_position_corner*bolt_width])(bolt_hole))
        bolt_holes.append(solid.translate([rack_x/2-bolt_position_corner*bolt_width,-rack_y/2+bolt_position_corner*bolt_width])(bolt_hole))
        bolt_holes = solid.union()(*bolt_holes)
        rack=solid.difference()(rack,bolt_holes)
    rack_support = rack

    #center rack with pipette holes
    #rack = solid.translate([0,0,-rack_thickness])(rack)
    rack = solid.translate([X_len/2,Y_len/2])(rack)
    rack = solid.translate([-alignment_offset[0],-alignment_offset[1]])(rack)
    if not taper_angle == 0:
        wells=chamfer_extrude(pillar_height,taper_angle,segments=20)(wells)
    else:
        wells = solid.linear_extrude(height=pillar_height)(wells)
    rack = solid.union()(rack,wells)
    return rack, rack_support

def deg_taper_len(height,deg):
    if not deg == 0:
        return height*math.tan(math.radians(deg))
    else:
        return 0

def make_outline(inner_dims,wall_thickness,grid_size,dims,alignment_offset):
    inner_dims=np.array(inner_dims)
    inner_outline=solid.square(inner_dims,center=True)
    outer_dims=inner_dims+wall_thickness
    outer_outline=solid.square(outer_dims,center=True)
    outline=solid.difference()(outer_outline,inner_outline)
    outline=solid.translate([grid_size[0]*dims[0]/2.0,grid_size[1]*dims[1]/2.0])(outline)
    return outline








 
 
************************************************/
